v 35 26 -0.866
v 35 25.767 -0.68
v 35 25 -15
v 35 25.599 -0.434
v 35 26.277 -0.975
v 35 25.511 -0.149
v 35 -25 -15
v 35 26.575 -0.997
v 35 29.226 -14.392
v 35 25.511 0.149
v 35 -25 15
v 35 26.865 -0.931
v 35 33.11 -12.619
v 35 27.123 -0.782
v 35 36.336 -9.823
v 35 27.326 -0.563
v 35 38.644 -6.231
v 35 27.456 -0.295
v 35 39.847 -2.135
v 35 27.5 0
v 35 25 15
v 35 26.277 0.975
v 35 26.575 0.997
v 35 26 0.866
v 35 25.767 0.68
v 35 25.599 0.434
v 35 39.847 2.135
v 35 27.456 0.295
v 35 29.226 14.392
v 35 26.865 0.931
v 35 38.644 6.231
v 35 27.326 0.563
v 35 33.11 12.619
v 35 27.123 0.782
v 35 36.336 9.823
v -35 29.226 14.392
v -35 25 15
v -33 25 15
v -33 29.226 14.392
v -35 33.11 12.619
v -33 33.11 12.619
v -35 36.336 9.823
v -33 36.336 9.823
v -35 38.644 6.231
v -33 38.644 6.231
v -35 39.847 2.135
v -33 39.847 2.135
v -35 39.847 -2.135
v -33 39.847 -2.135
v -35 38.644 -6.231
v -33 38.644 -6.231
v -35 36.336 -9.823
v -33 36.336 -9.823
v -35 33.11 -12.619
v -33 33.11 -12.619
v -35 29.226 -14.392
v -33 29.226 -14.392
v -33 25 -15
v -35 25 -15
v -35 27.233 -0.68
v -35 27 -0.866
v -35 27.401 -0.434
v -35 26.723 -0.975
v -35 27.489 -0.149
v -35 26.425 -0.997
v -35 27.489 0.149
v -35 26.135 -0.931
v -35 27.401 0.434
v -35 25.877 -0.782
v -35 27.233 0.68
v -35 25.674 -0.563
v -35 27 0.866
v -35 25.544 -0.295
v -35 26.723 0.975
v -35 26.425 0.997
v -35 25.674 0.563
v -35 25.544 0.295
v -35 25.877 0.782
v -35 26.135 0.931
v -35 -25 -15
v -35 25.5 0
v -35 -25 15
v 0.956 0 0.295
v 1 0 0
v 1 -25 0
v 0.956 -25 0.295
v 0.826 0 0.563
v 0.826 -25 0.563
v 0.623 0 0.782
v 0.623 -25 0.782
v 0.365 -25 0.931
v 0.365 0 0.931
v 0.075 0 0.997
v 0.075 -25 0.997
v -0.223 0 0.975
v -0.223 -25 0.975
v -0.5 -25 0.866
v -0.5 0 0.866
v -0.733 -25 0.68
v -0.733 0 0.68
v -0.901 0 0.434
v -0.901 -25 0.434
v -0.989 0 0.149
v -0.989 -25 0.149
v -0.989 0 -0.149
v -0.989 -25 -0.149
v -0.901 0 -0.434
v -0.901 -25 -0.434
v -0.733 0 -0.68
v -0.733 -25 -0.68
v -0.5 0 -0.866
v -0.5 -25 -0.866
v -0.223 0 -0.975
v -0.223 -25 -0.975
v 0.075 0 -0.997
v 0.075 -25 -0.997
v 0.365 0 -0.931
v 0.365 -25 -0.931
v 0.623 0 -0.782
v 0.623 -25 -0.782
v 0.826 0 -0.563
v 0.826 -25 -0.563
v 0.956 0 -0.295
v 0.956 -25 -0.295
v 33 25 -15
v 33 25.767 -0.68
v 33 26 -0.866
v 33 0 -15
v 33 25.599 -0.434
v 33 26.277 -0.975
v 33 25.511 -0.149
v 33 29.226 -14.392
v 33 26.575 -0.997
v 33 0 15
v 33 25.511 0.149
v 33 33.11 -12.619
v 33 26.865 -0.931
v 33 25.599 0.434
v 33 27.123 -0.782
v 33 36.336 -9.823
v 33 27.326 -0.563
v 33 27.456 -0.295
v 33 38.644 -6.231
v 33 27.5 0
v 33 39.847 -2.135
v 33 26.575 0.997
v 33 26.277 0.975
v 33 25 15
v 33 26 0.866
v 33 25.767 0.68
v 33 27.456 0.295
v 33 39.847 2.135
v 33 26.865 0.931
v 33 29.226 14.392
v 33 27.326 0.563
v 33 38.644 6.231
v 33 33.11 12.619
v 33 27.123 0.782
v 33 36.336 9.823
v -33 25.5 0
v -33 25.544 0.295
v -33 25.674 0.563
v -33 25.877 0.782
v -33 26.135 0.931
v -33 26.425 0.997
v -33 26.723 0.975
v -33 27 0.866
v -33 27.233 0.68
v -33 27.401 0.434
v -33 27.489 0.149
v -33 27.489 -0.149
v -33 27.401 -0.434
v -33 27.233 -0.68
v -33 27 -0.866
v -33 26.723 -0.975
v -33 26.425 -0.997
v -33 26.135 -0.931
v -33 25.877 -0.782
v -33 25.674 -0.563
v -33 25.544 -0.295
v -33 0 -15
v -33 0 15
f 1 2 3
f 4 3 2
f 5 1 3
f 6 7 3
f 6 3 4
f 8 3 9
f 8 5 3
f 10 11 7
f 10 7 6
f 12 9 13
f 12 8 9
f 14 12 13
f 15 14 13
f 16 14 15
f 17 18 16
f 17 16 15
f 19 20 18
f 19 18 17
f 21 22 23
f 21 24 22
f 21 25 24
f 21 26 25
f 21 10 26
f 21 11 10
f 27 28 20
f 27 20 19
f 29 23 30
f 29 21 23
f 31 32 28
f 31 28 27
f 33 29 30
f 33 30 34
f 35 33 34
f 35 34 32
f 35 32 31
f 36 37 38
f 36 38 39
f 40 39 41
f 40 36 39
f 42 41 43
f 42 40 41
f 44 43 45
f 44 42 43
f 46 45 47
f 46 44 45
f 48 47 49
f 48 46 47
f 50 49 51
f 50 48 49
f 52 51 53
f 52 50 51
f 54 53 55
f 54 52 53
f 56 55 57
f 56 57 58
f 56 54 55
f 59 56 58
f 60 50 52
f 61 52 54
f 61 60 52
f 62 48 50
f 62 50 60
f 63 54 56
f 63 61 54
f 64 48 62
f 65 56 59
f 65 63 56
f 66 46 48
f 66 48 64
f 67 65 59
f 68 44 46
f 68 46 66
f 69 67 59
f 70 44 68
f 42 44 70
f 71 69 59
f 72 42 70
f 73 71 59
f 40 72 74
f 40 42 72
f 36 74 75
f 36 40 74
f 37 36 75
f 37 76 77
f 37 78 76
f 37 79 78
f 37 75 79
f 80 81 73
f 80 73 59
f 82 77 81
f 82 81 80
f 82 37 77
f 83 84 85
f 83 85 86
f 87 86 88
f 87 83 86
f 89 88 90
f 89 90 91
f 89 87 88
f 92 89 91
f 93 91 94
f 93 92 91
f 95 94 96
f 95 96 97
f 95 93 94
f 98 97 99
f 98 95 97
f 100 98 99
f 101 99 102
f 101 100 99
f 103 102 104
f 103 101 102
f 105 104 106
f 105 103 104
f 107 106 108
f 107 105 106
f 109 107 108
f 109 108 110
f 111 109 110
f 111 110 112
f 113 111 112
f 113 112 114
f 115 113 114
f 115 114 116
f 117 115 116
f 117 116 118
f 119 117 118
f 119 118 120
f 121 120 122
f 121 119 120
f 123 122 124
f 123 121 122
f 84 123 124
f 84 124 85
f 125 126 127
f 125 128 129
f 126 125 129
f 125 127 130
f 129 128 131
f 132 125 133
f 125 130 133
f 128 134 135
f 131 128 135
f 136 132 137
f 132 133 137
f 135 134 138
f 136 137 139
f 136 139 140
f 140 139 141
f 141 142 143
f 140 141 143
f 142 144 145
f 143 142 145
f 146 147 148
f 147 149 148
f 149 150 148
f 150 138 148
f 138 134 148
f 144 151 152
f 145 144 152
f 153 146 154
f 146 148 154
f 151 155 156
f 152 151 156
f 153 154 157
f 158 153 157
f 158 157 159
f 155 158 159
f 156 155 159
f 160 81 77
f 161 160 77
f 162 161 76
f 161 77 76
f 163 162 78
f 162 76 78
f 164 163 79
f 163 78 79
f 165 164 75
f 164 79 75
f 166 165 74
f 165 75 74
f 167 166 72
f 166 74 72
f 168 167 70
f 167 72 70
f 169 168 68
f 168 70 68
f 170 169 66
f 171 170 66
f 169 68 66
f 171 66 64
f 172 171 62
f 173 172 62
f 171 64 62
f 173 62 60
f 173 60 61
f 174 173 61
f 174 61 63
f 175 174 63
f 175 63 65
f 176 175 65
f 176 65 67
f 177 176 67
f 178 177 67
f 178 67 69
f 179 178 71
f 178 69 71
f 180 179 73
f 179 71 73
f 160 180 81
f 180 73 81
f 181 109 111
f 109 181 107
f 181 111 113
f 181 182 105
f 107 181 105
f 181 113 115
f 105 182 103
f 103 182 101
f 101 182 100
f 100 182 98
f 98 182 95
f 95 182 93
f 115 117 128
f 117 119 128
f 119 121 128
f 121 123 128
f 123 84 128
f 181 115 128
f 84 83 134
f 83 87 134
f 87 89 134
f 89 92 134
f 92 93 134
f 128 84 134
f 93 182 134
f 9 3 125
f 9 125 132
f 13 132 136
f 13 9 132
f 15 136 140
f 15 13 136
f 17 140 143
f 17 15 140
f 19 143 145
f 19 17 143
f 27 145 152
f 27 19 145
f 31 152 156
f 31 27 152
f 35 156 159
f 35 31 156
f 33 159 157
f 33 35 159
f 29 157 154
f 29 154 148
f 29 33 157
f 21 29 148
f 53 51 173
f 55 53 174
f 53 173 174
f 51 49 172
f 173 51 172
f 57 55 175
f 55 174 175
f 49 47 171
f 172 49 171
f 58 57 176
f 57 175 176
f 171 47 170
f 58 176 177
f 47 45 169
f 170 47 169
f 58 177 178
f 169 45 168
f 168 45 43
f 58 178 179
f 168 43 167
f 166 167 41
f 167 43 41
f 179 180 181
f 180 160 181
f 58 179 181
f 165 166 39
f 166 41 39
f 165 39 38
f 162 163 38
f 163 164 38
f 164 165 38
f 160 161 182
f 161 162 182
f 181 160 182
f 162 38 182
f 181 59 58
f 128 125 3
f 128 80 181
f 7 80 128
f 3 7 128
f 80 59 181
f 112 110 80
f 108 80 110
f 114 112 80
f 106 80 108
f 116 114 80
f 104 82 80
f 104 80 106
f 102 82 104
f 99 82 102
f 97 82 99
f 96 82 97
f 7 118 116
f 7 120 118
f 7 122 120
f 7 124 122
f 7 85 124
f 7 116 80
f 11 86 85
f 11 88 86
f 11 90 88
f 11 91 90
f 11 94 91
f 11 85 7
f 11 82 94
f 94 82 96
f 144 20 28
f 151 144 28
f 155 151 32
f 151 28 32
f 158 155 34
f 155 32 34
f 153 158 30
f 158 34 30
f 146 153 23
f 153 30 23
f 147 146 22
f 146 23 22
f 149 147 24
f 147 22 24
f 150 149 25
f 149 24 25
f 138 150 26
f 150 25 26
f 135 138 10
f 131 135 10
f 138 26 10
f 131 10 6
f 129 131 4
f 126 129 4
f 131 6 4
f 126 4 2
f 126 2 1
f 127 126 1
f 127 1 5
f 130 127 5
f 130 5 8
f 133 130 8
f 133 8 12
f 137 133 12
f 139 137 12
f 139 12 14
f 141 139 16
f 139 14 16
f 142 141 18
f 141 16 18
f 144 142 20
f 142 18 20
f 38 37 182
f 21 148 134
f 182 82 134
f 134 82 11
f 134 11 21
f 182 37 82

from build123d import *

# Parameters (mm, degrees)
F0_W     = 2
F0_H     = 30
F0_W_2   = 66
F0_R     = 1
F1_DEPTH = 25
F2_DEPTH = 25
F3_R     = 1
F4_DEPTH = 2
F5_R     = 1
F6_DEPTH = 2


# Not quite as in the source:
# - a feature names something its author has since deleted; it is built from what else it names


with BuildPart() as f1:
    # F0 (on Front) → F1 (new body)
    with BuildSketch(Plane.XZ):
        with Locations((-34, 0)):
            Rectangle(F0_W, F0_H)
        with Locations((34, 0)):
            Rectangle(F0_W, F0_H)
        Rectangle(F0_W_2, F0_H)
        Circle(F0_R, mode=Mode.SUBTRACT)
    extrude(amount=F1_DEPTH)

    # F0 (on Front) → F2 (join)
    with BuildSketch(Plane.XZ):
        with Locations((34, 0)):
            Rectangle(F0_W, F0_H)
        with Locations((-34, 0)):
            Rectangle(F0_W, F0_H)
    extrude(amount=-F2_DEPTH)

    # F3 (on face) → F4 (join)
    with BuildSketch(Plane.YZ.offset(35)):
        with BuildLine():
            Line((25, 15), (25, -15))
            ThreePointArc((25, -15), (40, 0), (25, 15))
        make_face()
        with Locations((26.5, 0)):
            Circle(F3_R, mode=Mode.SUBTRACT)
    extrude(amount=-F4_DEPTH)

    # F5 (on face) → F6 (join)
    with BuildSketch(Plane(origin=(-35, 0, 0), x_dir=(0, -1, 0), z_dir=(-1, 0, 0))):
        with BuildLine():
            Line((-25, -15), (-25, 15))
            ThreePointArc((-25, 15), (-40, 0), (-25, -15))
        make_face()
        with Locations((-26.5, 0)):
            Circle(F5_R, mode=Mode.SUBTRACT)
    extrude(amount=-F6_DEPTH)


solid = f1.part
